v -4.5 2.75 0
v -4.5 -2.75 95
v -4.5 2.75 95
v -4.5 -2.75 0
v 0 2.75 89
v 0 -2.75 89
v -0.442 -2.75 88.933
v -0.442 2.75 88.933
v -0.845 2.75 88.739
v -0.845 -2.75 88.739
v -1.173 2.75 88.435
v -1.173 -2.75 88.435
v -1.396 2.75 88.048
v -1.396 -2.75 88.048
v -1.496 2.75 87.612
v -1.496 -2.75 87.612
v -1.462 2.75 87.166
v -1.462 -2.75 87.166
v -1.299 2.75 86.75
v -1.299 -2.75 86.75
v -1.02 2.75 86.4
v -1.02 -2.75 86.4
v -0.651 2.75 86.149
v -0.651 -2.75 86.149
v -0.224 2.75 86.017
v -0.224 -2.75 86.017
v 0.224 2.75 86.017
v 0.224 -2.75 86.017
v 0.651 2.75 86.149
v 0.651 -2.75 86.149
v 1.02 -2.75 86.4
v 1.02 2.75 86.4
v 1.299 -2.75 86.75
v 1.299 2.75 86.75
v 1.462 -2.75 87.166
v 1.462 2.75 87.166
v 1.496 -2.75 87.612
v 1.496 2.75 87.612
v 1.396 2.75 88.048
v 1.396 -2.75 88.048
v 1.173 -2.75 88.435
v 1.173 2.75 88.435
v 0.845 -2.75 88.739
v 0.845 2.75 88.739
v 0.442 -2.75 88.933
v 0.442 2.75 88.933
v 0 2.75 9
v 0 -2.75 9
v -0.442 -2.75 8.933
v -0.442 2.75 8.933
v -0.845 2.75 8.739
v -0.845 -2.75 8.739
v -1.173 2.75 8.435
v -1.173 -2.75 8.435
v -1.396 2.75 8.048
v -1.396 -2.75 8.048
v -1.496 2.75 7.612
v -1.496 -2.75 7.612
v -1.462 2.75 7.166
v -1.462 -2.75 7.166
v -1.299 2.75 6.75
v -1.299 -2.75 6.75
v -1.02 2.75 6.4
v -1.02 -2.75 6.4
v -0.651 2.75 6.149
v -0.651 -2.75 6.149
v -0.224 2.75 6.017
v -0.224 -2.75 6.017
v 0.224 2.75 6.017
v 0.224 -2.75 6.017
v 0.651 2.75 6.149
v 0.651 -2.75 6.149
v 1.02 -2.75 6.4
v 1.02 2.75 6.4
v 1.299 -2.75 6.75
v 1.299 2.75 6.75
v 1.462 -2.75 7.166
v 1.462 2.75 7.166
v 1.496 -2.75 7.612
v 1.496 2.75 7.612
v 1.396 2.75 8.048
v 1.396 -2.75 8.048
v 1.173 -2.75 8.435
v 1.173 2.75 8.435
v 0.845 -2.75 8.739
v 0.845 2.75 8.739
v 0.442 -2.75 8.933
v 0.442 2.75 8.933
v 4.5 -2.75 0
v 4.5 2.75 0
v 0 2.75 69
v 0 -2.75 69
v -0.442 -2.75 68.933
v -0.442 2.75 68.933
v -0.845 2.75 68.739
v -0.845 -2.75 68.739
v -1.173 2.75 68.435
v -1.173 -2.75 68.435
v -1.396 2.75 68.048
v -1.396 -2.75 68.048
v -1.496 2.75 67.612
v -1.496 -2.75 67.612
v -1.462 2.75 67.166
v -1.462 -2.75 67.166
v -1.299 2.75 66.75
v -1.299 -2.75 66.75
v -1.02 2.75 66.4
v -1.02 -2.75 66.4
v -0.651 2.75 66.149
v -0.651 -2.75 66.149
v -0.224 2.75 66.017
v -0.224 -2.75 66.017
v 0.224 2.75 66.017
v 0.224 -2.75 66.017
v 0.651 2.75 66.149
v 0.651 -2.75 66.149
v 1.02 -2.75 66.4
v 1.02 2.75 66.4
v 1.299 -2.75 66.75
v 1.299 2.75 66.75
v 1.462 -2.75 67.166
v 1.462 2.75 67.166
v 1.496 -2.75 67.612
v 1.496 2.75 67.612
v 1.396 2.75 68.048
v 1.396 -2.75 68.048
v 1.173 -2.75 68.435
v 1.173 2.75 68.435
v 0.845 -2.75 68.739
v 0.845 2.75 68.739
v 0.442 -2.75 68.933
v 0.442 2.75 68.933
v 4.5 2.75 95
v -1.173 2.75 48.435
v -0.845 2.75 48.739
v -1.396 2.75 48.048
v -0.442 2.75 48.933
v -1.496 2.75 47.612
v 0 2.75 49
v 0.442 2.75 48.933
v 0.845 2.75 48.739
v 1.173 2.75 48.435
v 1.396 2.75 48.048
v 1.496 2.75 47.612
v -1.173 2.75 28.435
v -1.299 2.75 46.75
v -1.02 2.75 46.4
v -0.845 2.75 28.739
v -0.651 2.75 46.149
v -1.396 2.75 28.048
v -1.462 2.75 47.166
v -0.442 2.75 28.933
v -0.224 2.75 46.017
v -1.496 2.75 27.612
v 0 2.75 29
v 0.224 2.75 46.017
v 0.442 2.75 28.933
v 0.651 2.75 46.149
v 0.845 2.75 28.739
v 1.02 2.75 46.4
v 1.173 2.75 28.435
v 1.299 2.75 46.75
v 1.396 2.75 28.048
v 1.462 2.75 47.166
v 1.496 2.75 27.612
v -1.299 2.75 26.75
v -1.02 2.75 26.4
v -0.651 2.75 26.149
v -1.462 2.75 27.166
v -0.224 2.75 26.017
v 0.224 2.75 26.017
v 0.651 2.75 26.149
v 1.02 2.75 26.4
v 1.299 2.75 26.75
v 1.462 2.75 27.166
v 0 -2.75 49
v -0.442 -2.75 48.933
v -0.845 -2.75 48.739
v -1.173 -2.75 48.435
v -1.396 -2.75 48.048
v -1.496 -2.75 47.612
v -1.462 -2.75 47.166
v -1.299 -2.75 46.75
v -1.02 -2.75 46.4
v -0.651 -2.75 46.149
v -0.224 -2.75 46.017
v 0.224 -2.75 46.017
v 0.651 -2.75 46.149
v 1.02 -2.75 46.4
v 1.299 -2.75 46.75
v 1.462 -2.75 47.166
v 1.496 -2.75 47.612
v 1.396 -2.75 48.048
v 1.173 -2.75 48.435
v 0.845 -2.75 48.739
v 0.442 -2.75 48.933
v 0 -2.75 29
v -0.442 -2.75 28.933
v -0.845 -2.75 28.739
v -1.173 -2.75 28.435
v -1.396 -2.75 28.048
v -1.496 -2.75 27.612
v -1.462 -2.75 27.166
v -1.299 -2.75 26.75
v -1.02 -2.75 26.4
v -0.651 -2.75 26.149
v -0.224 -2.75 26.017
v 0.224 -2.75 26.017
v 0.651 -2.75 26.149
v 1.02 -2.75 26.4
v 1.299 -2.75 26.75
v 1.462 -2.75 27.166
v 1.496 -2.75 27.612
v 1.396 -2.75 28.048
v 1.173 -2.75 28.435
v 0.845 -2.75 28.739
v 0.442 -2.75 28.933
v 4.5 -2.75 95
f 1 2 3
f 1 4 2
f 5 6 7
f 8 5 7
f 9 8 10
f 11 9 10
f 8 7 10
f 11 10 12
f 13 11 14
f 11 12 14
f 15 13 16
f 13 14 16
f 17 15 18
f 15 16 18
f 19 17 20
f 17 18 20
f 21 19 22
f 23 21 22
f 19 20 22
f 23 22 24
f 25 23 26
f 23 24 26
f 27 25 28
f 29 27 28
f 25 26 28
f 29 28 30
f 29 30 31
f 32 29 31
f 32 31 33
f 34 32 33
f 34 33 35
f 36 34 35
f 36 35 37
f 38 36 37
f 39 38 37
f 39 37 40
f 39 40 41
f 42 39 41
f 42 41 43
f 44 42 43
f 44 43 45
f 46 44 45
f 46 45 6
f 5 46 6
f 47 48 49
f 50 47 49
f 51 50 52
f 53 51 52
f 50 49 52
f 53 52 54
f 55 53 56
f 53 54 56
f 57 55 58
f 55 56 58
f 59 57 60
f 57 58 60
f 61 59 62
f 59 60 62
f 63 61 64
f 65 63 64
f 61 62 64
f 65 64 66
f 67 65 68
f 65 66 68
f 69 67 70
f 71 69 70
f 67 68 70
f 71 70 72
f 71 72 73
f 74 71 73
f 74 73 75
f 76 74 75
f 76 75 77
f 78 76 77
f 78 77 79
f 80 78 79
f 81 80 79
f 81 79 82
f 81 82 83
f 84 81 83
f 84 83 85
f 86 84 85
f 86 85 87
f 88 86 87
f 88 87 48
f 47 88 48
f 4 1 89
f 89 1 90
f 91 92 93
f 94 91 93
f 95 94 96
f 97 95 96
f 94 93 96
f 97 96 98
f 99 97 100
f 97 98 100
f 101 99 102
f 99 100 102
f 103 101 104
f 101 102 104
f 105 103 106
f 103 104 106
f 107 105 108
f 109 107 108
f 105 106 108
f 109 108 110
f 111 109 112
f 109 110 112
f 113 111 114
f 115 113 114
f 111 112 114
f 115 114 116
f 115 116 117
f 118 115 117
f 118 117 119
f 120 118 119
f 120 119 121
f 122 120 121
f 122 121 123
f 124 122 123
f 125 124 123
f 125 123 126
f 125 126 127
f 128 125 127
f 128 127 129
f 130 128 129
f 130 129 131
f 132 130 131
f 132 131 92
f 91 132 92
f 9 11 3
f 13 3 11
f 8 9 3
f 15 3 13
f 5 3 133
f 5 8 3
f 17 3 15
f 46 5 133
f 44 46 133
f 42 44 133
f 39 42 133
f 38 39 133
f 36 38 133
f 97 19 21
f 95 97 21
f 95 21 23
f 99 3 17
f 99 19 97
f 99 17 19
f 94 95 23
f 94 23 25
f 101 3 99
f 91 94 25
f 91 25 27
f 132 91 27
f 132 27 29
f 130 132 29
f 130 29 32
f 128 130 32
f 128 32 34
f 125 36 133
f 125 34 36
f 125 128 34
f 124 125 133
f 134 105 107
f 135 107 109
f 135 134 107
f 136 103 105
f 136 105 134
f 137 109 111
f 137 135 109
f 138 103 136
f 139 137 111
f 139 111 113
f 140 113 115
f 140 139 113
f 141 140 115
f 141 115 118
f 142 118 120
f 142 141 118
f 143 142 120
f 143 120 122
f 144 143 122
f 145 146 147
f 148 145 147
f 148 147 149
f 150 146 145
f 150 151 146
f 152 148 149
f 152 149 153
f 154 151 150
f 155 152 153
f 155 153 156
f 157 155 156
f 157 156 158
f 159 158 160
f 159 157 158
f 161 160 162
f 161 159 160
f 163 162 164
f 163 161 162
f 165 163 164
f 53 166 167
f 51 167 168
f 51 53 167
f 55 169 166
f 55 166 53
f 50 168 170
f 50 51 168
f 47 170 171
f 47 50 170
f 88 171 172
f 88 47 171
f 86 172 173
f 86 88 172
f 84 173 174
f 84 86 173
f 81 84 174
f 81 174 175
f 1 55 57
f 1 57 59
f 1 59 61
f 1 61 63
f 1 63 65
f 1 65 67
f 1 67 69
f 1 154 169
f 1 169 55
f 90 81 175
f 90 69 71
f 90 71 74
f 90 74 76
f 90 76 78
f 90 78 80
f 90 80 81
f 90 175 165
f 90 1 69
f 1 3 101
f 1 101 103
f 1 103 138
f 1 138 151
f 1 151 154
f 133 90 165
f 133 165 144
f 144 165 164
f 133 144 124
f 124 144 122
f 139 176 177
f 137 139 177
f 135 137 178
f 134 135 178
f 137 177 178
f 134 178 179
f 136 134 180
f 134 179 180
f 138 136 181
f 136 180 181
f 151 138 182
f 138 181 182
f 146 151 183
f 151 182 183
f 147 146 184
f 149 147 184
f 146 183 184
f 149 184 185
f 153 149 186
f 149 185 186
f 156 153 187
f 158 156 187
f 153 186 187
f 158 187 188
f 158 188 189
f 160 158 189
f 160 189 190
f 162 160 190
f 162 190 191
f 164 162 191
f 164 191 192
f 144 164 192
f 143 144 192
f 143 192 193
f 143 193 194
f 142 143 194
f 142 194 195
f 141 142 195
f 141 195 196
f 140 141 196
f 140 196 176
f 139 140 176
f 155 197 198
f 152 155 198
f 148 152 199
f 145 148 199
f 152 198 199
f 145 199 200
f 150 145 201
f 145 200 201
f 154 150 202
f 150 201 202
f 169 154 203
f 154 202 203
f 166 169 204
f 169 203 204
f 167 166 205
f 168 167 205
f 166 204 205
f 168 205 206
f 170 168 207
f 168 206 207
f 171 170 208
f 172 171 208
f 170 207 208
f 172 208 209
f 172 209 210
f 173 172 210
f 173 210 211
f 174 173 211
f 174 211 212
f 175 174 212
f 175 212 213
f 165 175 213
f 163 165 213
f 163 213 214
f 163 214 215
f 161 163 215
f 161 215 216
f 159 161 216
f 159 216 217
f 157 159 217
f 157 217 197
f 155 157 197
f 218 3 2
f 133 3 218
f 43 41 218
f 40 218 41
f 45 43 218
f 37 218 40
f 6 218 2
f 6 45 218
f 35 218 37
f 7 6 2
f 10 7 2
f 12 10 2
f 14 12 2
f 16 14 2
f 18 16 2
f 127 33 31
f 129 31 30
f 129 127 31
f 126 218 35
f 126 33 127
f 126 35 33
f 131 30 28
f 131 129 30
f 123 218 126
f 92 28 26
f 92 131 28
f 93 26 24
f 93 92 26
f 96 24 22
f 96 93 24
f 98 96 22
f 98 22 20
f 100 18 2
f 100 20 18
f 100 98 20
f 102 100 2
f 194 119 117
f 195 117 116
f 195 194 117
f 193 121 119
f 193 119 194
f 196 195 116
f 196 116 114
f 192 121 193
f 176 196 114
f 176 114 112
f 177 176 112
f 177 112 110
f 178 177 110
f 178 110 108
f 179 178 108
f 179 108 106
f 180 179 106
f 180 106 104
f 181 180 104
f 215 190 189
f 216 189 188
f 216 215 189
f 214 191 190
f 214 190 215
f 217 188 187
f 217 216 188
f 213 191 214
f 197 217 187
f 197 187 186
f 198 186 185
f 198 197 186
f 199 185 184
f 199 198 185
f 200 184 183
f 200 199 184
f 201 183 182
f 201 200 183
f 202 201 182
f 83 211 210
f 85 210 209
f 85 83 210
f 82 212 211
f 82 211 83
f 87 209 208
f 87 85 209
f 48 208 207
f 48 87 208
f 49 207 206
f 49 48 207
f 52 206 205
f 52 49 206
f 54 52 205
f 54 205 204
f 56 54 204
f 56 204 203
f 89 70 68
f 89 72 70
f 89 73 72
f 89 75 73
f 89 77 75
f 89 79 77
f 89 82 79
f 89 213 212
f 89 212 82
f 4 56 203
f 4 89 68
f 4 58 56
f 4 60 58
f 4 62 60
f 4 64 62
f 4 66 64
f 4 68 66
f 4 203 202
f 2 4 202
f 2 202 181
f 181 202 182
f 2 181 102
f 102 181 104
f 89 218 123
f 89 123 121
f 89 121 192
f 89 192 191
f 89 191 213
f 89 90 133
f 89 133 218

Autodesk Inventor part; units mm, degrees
ref_plane "YZ Plane" through (0, 0, 0) normal (1, 0, 0) x (0, 1, 0)
ref_plane "XZ Plane" through (0, 0, 0) normal (0, 1, 0) x (-1, 0, 0)
ref_plane "XY Plane" through (0, 0, 0) normal (0, 0, 1) x (1, 0, 0)
sketch "スケッチ1" plane through (0, 0, 0) normal (0, 0, 1) x (1, 0, 0)
  line L0 (4.5, -2.75) -> (-4.5, -2.75)
  line L1 (-4.5, -2.75) -> (-4.5, 2.75)
  line L2 (-4.5, 2.75) -> (4.5, 2.75)
  line L3 (4.5, 2.75) -> (4.5, -2.75)
  line L4 (4.5, -2.75) -> (-4.5, 2.75) construction
  line L5 (-4.5, -2.75) -> (4.5, 2.75) construction
  point P0 (0, 0)
  dimension "d0" = 9
  dimension "d1" = 5.5
extrude "押し出し1" add sketch "スケッチ1" along normal blind 95
sketch "スケッチ2" plane through (-4.5, 2.75, 0) normal (0, 1, 0) x (1, 0, 0)
  point P0 (4.5, 0)
  point P1 (4.5, -7.5)
  point P2 (4.5, -27.5)
  point P3 (4.5, -47.5)
  point P4 (4.5, -67.5)
  point P5 (4.5, -87.5)
  dimension "d4" = 47.5
  dimension "d5" = 20
  dimension "d6" = 20
  dimension "d7" = 20
  dimension "d8" = 20
hole "穴1" at (0, 2.75, 7.5) at (0, 2.75, 27.5) at (0, 2.75, 47.5) at (0, 2.75, 67.5) at (0, 2.75, 87.5) direction (0, -1, 0) diameter 3 end through all
equation "\"d6\" = d5"
equation "\"d7\" = d5"
equation "\"d8\" = d5"
properties part number "slider_b5p5x9_95_sa" material "ステンレス鋼"
